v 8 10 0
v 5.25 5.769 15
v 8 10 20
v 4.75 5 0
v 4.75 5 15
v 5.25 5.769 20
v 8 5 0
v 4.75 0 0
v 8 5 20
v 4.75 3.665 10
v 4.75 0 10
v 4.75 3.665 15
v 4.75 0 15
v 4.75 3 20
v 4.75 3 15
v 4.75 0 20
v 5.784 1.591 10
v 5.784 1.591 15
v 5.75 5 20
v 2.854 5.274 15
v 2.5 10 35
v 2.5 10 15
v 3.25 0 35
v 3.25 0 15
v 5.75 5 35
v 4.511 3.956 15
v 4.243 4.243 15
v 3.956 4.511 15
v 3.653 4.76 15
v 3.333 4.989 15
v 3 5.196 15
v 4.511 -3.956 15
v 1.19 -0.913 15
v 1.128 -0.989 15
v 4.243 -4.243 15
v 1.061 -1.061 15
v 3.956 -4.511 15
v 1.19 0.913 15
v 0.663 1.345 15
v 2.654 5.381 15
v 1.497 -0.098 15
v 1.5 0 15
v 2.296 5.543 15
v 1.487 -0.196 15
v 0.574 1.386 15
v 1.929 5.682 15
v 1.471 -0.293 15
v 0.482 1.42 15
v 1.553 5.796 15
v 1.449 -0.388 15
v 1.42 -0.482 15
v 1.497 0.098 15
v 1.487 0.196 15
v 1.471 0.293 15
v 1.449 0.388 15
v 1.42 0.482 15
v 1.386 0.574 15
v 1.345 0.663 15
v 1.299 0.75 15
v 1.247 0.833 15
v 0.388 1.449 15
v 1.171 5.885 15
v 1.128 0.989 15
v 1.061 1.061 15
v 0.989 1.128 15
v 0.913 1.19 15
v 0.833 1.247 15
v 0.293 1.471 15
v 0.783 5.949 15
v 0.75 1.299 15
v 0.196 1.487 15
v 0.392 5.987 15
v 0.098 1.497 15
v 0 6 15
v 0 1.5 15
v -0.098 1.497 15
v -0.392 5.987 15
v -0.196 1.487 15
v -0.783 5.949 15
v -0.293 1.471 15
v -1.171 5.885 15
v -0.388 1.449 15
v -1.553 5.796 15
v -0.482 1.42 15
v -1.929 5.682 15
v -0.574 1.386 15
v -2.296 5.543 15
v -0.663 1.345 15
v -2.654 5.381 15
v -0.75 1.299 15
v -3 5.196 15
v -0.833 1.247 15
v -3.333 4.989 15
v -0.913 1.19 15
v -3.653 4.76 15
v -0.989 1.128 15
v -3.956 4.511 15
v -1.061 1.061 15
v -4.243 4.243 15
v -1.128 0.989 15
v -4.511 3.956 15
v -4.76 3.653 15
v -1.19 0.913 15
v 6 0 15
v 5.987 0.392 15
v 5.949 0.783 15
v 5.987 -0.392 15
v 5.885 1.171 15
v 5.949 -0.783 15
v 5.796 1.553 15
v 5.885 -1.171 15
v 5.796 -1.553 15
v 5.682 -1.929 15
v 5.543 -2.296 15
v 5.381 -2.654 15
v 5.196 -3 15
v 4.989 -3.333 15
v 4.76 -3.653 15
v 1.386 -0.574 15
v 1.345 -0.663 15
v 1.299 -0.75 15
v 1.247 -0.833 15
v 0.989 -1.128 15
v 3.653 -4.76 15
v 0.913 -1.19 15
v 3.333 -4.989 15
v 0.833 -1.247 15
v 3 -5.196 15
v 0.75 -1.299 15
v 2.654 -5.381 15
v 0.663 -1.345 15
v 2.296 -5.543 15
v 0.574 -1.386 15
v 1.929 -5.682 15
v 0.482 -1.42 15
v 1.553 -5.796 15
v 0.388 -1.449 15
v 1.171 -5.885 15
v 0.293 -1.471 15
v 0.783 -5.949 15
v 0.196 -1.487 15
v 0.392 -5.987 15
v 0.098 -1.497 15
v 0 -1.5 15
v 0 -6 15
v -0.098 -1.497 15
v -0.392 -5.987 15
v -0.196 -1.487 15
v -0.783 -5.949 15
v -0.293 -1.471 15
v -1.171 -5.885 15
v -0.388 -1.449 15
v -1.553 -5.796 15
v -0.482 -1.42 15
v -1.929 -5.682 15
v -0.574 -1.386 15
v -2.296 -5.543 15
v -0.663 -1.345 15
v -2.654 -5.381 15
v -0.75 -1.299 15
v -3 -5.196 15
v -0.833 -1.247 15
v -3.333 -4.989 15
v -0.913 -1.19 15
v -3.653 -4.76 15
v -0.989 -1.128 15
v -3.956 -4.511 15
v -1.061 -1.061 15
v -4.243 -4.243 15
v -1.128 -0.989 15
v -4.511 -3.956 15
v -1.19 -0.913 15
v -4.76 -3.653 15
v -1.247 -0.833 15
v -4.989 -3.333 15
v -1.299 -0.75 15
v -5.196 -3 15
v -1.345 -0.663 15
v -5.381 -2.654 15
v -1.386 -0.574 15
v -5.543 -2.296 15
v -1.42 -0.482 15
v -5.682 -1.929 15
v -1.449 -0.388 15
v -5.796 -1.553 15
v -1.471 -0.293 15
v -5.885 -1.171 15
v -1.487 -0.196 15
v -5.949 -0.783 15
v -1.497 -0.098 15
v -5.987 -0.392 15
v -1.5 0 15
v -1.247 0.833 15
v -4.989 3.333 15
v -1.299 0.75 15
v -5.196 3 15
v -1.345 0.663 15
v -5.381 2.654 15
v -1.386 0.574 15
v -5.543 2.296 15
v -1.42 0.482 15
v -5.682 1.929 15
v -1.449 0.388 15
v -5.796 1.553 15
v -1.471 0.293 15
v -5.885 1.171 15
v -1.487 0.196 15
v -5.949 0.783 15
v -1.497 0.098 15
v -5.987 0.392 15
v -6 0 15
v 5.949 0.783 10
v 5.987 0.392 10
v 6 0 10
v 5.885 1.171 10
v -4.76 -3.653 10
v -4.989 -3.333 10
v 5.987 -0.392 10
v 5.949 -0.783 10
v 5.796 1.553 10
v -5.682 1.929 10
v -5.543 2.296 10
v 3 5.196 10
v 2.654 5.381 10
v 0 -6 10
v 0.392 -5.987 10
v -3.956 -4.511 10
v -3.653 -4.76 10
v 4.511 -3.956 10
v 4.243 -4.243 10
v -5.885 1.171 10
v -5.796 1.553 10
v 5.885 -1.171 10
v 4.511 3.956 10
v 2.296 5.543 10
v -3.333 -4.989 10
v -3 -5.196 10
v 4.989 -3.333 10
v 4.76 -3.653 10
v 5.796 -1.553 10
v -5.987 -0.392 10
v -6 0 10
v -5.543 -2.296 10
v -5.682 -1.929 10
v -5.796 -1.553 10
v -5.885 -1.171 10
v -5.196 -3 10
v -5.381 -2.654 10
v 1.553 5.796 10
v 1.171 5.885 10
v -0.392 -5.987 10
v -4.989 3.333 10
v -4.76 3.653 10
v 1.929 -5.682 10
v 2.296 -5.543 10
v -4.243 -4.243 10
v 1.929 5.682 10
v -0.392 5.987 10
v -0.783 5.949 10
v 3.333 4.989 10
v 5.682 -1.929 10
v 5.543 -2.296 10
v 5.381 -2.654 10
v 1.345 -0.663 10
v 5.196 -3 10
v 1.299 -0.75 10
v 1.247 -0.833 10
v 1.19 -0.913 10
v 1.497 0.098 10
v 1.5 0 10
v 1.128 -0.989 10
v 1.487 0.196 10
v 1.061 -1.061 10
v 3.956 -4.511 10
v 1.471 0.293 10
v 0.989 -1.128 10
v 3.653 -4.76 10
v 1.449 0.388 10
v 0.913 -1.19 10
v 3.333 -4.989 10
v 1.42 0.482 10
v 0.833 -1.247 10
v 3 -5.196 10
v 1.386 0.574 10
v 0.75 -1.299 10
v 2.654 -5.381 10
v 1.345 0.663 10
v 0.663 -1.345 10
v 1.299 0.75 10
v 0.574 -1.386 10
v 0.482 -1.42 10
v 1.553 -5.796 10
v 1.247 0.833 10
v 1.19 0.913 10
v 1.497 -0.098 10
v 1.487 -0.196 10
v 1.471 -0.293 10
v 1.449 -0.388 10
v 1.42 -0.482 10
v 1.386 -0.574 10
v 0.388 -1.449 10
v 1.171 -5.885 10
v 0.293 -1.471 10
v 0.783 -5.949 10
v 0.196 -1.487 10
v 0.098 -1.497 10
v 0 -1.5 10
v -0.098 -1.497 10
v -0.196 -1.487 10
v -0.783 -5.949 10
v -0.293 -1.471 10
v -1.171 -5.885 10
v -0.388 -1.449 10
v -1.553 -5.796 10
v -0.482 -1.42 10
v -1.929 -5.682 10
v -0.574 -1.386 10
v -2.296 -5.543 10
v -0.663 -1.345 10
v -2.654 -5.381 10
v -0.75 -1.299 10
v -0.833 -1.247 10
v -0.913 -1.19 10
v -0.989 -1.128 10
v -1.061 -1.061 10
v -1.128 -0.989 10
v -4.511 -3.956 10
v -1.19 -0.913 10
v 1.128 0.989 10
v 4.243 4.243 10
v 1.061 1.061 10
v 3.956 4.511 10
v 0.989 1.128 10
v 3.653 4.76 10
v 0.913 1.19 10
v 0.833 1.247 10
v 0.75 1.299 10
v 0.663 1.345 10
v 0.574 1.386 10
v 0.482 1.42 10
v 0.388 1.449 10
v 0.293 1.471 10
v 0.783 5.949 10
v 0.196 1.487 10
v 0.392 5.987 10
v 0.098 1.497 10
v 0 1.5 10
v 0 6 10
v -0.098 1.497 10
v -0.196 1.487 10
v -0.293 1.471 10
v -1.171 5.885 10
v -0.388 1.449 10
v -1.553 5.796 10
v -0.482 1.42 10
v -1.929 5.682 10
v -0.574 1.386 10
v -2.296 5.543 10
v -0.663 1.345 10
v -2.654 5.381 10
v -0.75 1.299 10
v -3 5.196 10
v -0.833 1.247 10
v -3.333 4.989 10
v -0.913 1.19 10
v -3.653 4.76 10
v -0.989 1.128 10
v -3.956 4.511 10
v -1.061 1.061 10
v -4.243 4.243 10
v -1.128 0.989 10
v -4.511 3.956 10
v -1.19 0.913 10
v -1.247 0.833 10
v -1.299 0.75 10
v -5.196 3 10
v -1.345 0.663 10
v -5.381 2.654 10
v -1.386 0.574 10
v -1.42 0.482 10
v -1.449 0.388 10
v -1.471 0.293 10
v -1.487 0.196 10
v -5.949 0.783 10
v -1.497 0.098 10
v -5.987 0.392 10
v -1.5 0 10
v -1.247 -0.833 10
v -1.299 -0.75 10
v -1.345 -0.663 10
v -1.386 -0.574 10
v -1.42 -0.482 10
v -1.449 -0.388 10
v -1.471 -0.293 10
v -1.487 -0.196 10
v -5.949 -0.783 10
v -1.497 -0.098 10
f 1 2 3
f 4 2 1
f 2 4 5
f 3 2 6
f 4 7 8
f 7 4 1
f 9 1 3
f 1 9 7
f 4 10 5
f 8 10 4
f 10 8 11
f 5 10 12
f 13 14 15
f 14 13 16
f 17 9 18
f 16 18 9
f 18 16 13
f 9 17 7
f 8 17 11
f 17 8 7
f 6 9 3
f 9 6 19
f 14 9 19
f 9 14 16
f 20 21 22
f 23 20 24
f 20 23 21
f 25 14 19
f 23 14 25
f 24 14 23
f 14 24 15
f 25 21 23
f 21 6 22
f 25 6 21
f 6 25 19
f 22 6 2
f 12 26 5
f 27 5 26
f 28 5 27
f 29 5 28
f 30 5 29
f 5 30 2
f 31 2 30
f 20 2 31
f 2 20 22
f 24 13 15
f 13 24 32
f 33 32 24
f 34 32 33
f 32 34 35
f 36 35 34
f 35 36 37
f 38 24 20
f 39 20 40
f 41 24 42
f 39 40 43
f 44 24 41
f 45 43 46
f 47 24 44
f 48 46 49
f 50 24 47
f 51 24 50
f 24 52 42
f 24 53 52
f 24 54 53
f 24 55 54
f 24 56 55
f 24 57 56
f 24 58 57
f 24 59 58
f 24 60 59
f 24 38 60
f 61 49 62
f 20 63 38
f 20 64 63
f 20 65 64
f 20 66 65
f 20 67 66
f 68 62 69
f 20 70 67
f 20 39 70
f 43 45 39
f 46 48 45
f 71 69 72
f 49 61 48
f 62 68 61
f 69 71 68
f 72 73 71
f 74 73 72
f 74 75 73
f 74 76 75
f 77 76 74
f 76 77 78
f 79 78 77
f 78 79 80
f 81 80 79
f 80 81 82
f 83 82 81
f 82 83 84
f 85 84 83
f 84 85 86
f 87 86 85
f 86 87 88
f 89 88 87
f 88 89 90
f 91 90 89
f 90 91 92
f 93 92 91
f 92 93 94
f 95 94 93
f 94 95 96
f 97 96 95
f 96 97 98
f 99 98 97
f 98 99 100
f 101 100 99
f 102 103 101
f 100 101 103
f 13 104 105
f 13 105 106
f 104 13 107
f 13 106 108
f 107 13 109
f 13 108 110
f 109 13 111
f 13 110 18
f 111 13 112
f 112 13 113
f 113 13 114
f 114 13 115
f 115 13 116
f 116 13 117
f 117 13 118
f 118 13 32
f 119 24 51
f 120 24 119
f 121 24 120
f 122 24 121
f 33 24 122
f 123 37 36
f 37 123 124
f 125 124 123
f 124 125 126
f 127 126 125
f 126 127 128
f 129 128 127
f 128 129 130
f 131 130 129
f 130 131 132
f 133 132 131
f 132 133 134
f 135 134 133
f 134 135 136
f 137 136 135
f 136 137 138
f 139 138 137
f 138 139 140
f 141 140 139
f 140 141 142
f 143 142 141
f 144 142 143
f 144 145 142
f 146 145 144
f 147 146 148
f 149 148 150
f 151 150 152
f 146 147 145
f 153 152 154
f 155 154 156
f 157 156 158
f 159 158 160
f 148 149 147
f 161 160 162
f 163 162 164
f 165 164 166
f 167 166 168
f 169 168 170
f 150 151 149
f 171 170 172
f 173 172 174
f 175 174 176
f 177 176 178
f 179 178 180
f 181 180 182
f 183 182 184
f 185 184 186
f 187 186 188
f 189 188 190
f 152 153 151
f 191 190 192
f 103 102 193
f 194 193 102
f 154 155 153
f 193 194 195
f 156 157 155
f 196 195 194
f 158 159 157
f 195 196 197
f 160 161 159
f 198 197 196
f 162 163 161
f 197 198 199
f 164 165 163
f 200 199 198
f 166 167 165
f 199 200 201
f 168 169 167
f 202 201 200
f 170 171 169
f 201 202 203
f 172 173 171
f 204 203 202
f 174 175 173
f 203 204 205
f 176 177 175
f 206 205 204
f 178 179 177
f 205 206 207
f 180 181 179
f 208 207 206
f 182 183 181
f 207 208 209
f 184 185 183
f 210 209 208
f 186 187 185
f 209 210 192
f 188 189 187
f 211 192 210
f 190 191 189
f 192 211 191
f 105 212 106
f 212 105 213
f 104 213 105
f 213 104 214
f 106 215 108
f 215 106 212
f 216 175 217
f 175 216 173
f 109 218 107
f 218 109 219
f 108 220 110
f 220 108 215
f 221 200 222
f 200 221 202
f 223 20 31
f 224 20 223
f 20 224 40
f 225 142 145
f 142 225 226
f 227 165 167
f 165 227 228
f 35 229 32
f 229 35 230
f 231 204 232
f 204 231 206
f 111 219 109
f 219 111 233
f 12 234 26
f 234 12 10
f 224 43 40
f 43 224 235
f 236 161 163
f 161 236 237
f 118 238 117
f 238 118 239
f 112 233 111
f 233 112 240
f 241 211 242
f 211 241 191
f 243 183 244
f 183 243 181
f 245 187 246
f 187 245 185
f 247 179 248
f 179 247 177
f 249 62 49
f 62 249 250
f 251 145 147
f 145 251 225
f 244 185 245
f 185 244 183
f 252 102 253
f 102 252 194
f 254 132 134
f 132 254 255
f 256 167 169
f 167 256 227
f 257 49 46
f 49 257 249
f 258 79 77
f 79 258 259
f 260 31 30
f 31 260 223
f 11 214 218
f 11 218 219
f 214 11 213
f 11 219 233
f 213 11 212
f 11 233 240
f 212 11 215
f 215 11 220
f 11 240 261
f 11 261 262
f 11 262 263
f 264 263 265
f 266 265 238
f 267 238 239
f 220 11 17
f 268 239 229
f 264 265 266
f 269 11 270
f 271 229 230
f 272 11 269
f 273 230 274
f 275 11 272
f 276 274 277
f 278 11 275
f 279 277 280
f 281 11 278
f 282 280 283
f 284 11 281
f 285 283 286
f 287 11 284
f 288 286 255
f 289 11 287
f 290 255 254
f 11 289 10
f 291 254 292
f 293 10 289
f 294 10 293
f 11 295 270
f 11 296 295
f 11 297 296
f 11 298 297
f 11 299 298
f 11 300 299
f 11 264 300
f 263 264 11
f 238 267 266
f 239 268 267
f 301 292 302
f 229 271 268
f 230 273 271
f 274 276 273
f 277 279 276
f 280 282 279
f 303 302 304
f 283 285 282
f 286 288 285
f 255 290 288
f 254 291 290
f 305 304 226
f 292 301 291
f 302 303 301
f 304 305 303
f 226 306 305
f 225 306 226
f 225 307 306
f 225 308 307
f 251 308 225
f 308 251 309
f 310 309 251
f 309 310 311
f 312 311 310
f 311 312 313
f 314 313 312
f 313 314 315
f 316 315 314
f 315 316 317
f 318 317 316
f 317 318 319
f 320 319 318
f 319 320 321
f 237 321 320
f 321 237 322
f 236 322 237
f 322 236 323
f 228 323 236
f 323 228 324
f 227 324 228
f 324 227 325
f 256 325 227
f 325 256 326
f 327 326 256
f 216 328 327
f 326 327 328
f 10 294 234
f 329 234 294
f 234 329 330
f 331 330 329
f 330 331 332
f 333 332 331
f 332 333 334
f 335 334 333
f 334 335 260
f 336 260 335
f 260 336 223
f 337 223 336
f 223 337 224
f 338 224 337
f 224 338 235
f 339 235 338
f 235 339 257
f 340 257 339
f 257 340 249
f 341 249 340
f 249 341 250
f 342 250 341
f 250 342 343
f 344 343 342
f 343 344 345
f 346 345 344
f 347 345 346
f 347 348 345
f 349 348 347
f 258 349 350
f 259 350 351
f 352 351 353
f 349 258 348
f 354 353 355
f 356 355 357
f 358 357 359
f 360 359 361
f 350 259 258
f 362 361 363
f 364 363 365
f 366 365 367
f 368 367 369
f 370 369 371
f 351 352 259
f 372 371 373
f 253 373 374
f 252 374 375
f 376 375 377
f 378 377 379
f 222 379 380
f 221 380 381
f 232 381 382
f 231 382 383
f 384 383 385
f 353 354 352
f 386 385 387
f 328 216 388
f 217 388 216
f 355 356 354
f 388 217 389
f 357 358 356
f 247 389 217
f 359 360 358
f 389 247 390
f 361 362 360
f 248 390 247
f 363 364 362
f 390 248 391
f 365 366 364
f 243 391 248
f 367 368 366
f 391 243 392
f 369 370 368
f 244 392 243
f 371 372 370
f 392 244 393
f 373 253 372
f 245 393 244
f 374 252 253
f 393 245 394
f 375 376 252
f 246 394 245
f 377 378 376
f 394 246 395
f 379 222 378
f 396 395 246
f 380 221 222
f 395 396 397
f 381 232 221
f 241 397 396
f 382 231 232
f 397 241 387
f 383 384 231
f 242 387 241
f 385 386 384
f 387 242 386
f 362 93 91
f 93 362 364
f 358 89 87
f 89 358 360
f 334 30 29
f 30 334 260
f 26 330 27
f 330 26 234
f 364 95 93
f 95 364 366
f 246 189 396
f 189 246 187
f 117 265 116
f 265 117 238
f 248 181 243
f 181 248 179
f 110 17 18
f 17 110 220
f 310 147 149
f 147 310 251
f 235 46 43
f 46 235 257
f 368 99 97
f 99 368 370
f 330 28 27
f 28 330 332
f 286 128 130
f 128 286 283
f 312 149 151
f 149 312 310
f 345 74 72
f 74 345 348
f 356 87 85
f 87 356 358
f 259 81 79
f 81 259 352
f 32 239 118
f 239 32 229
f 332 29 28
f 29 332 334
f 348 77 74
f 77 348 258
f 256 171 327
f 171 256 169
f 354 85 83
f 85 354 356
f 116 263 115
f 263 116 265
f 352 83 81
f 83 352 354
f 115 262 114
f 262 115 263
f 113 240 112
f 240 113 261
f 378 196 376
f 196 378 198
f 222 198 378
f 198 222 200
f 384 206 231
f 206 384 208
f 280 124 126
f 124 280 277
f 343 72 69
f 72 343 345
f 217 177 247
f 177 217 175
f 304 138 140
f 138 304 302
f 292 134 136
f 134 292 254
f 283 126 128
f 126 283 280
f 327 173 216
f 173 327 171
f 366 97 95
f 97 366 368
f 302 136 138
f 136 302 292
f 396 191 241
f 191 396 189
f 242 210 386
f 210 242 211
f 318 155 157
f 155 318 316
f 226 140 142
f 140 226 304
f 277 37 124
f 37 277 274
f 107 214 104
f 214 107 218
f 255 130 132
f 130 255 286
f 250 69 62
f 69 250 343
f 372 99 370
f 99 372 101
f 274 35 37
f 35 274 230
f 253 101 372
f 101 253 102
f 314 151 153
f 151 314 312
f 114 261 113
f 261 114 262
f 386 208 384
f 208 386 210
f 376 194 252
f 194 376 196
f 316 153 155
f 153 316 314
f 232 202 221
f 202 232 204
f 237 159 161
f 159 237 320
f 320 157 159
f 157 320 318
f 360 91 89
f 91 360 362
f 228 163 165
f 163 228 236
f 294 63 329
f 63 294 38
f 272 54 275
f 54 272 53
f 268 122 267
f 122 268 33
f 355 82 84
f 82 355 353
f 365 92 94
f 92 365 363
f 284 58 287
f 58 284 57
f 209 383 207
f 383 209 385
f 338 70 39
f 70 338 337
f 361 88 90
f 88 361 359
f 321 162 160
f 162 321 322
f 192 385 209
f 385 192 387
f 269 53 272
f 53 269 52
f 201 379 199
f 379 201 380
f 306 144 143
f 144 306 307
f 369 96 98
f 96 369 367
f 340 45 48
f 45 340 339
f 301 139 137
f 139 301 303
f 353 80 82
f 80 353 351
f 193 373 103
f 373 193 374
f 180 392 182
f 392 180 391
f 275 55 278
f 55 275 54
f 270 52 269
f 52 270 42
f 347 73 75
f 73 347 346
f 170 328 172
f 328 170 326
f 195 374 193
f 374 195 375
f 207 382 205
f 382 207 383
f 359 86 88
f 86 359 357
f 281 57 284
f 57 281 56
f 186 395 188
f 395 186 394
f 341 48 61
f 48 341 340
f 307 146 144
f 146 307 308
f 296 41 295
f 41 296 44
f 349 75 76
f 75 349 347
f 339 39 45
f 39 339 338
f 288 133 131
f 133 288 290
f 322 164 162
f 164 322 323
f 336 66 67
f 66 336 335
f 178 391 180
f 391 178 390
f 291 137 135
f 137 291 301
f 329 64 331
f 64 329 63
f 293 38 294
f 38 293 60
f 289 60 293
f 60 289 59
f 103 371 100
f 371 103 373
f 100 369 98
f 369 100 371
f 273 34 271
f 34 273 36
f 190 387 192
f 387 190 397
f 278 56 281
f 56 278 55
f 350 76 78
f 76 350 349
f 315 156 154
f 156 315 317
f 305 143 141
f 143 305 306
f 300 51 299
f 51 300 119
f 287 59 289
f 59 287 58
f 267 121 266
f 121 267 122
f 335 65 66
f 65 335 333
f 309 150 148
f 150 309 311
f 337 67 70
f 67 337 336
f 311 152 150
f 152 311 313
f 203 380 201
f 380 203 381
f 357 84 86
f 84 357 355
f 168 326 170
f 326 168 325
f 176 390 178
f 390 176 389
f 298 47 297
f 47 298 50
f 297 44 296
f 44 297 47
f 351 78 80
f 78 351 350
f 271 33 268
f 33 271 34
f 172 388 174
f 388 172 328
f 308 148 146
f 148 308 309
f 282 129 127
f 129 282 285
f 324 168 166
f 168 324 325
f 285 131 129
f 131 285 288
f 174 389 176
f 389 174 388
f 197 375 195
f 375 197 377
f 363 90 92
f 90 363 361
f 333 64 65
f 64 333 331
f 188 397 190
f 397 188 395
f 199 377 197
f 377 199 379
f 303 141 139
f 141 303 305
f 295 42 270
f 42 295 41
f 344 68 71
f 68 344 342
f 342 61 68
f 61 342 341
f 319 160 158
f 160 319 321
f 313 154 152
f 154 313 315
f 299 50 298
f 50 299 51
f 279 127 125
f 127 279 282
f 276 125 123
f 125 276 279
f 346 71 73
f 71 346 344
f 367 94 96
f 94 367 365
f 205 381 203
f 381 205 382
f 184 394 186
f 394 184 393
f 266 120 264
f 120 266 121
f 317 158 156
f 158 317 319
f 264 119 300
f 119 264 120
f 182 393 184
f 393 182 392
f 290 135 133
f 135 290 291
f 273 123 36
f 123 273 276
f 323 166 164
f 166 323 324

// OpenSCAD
// Straight hose-barb reducer
// Print orientation: standing upright along Z

$fn = 96;

// ---- Dimensions (mm) ----
id_large      = 8;     // inner diameter of 8 mm tubing
id_small      = 5;     // inner diameter of 5 mm tubing
bore          = 3;     // through-bore diameter
barb_h        = 10;    // barb height (both tubing sizes)
od_large      = 9.5;   // 8 mm barb outer diameter at top
od_small      = 6.5;   // 5 mm barb outer diameter at top
collar_d      = 12;    // collar diameter
collar_h      = 5;     // collar height
eps           = 0.5;   // cutter overshoot

// ---- Derived ----
z0 = 0;                // start of barbs (8 mm)
z1 = barb_h;           // end of 8 mm barbs
z2 = z1 + collar_h;    // end of collar
z3 = z2 + barb_h;      // end of 5 mm barbs

// ---- Model ----
difference() {
    union() {
        // 8 mm tubing barbs: sawtooth profile, stacked
        for (i = [0 : 1])
            translate([0, 0, z0 + i * barb_h])
                linear_extrude(height = barb_h)
                    polygon([
                        [od_large / 2, 0],
                        [od_large / 2, barb_h / 2],
                        [(od_large + od_small) / 2, barb_h],
                        [(od_large + od_small) / 2, barb_h / 2]
                    ]);

        // Collar
        translate([0, 0, z2 - collar_h])
            cylinder(d = collar_d, h = collar_h);

        // 5 mm tubing barbs: shrinking profile, stacked
        for (i = [0 : 1])
            translate([0, 0, z3 - i * barb_h])
                linear_extrude(height = barb_h)
                    polygon([
                        [od_small / 2, 0],
                        [(od_small + id_small) / 2, barb_h / 2],
                        [id_small / 2, barb_h]
                    ]);
    }

    // Through-bore
    translate([0, 0, z0 - eps])
        cylinder(d = bore, h = z3 + 2 * eps);
}
